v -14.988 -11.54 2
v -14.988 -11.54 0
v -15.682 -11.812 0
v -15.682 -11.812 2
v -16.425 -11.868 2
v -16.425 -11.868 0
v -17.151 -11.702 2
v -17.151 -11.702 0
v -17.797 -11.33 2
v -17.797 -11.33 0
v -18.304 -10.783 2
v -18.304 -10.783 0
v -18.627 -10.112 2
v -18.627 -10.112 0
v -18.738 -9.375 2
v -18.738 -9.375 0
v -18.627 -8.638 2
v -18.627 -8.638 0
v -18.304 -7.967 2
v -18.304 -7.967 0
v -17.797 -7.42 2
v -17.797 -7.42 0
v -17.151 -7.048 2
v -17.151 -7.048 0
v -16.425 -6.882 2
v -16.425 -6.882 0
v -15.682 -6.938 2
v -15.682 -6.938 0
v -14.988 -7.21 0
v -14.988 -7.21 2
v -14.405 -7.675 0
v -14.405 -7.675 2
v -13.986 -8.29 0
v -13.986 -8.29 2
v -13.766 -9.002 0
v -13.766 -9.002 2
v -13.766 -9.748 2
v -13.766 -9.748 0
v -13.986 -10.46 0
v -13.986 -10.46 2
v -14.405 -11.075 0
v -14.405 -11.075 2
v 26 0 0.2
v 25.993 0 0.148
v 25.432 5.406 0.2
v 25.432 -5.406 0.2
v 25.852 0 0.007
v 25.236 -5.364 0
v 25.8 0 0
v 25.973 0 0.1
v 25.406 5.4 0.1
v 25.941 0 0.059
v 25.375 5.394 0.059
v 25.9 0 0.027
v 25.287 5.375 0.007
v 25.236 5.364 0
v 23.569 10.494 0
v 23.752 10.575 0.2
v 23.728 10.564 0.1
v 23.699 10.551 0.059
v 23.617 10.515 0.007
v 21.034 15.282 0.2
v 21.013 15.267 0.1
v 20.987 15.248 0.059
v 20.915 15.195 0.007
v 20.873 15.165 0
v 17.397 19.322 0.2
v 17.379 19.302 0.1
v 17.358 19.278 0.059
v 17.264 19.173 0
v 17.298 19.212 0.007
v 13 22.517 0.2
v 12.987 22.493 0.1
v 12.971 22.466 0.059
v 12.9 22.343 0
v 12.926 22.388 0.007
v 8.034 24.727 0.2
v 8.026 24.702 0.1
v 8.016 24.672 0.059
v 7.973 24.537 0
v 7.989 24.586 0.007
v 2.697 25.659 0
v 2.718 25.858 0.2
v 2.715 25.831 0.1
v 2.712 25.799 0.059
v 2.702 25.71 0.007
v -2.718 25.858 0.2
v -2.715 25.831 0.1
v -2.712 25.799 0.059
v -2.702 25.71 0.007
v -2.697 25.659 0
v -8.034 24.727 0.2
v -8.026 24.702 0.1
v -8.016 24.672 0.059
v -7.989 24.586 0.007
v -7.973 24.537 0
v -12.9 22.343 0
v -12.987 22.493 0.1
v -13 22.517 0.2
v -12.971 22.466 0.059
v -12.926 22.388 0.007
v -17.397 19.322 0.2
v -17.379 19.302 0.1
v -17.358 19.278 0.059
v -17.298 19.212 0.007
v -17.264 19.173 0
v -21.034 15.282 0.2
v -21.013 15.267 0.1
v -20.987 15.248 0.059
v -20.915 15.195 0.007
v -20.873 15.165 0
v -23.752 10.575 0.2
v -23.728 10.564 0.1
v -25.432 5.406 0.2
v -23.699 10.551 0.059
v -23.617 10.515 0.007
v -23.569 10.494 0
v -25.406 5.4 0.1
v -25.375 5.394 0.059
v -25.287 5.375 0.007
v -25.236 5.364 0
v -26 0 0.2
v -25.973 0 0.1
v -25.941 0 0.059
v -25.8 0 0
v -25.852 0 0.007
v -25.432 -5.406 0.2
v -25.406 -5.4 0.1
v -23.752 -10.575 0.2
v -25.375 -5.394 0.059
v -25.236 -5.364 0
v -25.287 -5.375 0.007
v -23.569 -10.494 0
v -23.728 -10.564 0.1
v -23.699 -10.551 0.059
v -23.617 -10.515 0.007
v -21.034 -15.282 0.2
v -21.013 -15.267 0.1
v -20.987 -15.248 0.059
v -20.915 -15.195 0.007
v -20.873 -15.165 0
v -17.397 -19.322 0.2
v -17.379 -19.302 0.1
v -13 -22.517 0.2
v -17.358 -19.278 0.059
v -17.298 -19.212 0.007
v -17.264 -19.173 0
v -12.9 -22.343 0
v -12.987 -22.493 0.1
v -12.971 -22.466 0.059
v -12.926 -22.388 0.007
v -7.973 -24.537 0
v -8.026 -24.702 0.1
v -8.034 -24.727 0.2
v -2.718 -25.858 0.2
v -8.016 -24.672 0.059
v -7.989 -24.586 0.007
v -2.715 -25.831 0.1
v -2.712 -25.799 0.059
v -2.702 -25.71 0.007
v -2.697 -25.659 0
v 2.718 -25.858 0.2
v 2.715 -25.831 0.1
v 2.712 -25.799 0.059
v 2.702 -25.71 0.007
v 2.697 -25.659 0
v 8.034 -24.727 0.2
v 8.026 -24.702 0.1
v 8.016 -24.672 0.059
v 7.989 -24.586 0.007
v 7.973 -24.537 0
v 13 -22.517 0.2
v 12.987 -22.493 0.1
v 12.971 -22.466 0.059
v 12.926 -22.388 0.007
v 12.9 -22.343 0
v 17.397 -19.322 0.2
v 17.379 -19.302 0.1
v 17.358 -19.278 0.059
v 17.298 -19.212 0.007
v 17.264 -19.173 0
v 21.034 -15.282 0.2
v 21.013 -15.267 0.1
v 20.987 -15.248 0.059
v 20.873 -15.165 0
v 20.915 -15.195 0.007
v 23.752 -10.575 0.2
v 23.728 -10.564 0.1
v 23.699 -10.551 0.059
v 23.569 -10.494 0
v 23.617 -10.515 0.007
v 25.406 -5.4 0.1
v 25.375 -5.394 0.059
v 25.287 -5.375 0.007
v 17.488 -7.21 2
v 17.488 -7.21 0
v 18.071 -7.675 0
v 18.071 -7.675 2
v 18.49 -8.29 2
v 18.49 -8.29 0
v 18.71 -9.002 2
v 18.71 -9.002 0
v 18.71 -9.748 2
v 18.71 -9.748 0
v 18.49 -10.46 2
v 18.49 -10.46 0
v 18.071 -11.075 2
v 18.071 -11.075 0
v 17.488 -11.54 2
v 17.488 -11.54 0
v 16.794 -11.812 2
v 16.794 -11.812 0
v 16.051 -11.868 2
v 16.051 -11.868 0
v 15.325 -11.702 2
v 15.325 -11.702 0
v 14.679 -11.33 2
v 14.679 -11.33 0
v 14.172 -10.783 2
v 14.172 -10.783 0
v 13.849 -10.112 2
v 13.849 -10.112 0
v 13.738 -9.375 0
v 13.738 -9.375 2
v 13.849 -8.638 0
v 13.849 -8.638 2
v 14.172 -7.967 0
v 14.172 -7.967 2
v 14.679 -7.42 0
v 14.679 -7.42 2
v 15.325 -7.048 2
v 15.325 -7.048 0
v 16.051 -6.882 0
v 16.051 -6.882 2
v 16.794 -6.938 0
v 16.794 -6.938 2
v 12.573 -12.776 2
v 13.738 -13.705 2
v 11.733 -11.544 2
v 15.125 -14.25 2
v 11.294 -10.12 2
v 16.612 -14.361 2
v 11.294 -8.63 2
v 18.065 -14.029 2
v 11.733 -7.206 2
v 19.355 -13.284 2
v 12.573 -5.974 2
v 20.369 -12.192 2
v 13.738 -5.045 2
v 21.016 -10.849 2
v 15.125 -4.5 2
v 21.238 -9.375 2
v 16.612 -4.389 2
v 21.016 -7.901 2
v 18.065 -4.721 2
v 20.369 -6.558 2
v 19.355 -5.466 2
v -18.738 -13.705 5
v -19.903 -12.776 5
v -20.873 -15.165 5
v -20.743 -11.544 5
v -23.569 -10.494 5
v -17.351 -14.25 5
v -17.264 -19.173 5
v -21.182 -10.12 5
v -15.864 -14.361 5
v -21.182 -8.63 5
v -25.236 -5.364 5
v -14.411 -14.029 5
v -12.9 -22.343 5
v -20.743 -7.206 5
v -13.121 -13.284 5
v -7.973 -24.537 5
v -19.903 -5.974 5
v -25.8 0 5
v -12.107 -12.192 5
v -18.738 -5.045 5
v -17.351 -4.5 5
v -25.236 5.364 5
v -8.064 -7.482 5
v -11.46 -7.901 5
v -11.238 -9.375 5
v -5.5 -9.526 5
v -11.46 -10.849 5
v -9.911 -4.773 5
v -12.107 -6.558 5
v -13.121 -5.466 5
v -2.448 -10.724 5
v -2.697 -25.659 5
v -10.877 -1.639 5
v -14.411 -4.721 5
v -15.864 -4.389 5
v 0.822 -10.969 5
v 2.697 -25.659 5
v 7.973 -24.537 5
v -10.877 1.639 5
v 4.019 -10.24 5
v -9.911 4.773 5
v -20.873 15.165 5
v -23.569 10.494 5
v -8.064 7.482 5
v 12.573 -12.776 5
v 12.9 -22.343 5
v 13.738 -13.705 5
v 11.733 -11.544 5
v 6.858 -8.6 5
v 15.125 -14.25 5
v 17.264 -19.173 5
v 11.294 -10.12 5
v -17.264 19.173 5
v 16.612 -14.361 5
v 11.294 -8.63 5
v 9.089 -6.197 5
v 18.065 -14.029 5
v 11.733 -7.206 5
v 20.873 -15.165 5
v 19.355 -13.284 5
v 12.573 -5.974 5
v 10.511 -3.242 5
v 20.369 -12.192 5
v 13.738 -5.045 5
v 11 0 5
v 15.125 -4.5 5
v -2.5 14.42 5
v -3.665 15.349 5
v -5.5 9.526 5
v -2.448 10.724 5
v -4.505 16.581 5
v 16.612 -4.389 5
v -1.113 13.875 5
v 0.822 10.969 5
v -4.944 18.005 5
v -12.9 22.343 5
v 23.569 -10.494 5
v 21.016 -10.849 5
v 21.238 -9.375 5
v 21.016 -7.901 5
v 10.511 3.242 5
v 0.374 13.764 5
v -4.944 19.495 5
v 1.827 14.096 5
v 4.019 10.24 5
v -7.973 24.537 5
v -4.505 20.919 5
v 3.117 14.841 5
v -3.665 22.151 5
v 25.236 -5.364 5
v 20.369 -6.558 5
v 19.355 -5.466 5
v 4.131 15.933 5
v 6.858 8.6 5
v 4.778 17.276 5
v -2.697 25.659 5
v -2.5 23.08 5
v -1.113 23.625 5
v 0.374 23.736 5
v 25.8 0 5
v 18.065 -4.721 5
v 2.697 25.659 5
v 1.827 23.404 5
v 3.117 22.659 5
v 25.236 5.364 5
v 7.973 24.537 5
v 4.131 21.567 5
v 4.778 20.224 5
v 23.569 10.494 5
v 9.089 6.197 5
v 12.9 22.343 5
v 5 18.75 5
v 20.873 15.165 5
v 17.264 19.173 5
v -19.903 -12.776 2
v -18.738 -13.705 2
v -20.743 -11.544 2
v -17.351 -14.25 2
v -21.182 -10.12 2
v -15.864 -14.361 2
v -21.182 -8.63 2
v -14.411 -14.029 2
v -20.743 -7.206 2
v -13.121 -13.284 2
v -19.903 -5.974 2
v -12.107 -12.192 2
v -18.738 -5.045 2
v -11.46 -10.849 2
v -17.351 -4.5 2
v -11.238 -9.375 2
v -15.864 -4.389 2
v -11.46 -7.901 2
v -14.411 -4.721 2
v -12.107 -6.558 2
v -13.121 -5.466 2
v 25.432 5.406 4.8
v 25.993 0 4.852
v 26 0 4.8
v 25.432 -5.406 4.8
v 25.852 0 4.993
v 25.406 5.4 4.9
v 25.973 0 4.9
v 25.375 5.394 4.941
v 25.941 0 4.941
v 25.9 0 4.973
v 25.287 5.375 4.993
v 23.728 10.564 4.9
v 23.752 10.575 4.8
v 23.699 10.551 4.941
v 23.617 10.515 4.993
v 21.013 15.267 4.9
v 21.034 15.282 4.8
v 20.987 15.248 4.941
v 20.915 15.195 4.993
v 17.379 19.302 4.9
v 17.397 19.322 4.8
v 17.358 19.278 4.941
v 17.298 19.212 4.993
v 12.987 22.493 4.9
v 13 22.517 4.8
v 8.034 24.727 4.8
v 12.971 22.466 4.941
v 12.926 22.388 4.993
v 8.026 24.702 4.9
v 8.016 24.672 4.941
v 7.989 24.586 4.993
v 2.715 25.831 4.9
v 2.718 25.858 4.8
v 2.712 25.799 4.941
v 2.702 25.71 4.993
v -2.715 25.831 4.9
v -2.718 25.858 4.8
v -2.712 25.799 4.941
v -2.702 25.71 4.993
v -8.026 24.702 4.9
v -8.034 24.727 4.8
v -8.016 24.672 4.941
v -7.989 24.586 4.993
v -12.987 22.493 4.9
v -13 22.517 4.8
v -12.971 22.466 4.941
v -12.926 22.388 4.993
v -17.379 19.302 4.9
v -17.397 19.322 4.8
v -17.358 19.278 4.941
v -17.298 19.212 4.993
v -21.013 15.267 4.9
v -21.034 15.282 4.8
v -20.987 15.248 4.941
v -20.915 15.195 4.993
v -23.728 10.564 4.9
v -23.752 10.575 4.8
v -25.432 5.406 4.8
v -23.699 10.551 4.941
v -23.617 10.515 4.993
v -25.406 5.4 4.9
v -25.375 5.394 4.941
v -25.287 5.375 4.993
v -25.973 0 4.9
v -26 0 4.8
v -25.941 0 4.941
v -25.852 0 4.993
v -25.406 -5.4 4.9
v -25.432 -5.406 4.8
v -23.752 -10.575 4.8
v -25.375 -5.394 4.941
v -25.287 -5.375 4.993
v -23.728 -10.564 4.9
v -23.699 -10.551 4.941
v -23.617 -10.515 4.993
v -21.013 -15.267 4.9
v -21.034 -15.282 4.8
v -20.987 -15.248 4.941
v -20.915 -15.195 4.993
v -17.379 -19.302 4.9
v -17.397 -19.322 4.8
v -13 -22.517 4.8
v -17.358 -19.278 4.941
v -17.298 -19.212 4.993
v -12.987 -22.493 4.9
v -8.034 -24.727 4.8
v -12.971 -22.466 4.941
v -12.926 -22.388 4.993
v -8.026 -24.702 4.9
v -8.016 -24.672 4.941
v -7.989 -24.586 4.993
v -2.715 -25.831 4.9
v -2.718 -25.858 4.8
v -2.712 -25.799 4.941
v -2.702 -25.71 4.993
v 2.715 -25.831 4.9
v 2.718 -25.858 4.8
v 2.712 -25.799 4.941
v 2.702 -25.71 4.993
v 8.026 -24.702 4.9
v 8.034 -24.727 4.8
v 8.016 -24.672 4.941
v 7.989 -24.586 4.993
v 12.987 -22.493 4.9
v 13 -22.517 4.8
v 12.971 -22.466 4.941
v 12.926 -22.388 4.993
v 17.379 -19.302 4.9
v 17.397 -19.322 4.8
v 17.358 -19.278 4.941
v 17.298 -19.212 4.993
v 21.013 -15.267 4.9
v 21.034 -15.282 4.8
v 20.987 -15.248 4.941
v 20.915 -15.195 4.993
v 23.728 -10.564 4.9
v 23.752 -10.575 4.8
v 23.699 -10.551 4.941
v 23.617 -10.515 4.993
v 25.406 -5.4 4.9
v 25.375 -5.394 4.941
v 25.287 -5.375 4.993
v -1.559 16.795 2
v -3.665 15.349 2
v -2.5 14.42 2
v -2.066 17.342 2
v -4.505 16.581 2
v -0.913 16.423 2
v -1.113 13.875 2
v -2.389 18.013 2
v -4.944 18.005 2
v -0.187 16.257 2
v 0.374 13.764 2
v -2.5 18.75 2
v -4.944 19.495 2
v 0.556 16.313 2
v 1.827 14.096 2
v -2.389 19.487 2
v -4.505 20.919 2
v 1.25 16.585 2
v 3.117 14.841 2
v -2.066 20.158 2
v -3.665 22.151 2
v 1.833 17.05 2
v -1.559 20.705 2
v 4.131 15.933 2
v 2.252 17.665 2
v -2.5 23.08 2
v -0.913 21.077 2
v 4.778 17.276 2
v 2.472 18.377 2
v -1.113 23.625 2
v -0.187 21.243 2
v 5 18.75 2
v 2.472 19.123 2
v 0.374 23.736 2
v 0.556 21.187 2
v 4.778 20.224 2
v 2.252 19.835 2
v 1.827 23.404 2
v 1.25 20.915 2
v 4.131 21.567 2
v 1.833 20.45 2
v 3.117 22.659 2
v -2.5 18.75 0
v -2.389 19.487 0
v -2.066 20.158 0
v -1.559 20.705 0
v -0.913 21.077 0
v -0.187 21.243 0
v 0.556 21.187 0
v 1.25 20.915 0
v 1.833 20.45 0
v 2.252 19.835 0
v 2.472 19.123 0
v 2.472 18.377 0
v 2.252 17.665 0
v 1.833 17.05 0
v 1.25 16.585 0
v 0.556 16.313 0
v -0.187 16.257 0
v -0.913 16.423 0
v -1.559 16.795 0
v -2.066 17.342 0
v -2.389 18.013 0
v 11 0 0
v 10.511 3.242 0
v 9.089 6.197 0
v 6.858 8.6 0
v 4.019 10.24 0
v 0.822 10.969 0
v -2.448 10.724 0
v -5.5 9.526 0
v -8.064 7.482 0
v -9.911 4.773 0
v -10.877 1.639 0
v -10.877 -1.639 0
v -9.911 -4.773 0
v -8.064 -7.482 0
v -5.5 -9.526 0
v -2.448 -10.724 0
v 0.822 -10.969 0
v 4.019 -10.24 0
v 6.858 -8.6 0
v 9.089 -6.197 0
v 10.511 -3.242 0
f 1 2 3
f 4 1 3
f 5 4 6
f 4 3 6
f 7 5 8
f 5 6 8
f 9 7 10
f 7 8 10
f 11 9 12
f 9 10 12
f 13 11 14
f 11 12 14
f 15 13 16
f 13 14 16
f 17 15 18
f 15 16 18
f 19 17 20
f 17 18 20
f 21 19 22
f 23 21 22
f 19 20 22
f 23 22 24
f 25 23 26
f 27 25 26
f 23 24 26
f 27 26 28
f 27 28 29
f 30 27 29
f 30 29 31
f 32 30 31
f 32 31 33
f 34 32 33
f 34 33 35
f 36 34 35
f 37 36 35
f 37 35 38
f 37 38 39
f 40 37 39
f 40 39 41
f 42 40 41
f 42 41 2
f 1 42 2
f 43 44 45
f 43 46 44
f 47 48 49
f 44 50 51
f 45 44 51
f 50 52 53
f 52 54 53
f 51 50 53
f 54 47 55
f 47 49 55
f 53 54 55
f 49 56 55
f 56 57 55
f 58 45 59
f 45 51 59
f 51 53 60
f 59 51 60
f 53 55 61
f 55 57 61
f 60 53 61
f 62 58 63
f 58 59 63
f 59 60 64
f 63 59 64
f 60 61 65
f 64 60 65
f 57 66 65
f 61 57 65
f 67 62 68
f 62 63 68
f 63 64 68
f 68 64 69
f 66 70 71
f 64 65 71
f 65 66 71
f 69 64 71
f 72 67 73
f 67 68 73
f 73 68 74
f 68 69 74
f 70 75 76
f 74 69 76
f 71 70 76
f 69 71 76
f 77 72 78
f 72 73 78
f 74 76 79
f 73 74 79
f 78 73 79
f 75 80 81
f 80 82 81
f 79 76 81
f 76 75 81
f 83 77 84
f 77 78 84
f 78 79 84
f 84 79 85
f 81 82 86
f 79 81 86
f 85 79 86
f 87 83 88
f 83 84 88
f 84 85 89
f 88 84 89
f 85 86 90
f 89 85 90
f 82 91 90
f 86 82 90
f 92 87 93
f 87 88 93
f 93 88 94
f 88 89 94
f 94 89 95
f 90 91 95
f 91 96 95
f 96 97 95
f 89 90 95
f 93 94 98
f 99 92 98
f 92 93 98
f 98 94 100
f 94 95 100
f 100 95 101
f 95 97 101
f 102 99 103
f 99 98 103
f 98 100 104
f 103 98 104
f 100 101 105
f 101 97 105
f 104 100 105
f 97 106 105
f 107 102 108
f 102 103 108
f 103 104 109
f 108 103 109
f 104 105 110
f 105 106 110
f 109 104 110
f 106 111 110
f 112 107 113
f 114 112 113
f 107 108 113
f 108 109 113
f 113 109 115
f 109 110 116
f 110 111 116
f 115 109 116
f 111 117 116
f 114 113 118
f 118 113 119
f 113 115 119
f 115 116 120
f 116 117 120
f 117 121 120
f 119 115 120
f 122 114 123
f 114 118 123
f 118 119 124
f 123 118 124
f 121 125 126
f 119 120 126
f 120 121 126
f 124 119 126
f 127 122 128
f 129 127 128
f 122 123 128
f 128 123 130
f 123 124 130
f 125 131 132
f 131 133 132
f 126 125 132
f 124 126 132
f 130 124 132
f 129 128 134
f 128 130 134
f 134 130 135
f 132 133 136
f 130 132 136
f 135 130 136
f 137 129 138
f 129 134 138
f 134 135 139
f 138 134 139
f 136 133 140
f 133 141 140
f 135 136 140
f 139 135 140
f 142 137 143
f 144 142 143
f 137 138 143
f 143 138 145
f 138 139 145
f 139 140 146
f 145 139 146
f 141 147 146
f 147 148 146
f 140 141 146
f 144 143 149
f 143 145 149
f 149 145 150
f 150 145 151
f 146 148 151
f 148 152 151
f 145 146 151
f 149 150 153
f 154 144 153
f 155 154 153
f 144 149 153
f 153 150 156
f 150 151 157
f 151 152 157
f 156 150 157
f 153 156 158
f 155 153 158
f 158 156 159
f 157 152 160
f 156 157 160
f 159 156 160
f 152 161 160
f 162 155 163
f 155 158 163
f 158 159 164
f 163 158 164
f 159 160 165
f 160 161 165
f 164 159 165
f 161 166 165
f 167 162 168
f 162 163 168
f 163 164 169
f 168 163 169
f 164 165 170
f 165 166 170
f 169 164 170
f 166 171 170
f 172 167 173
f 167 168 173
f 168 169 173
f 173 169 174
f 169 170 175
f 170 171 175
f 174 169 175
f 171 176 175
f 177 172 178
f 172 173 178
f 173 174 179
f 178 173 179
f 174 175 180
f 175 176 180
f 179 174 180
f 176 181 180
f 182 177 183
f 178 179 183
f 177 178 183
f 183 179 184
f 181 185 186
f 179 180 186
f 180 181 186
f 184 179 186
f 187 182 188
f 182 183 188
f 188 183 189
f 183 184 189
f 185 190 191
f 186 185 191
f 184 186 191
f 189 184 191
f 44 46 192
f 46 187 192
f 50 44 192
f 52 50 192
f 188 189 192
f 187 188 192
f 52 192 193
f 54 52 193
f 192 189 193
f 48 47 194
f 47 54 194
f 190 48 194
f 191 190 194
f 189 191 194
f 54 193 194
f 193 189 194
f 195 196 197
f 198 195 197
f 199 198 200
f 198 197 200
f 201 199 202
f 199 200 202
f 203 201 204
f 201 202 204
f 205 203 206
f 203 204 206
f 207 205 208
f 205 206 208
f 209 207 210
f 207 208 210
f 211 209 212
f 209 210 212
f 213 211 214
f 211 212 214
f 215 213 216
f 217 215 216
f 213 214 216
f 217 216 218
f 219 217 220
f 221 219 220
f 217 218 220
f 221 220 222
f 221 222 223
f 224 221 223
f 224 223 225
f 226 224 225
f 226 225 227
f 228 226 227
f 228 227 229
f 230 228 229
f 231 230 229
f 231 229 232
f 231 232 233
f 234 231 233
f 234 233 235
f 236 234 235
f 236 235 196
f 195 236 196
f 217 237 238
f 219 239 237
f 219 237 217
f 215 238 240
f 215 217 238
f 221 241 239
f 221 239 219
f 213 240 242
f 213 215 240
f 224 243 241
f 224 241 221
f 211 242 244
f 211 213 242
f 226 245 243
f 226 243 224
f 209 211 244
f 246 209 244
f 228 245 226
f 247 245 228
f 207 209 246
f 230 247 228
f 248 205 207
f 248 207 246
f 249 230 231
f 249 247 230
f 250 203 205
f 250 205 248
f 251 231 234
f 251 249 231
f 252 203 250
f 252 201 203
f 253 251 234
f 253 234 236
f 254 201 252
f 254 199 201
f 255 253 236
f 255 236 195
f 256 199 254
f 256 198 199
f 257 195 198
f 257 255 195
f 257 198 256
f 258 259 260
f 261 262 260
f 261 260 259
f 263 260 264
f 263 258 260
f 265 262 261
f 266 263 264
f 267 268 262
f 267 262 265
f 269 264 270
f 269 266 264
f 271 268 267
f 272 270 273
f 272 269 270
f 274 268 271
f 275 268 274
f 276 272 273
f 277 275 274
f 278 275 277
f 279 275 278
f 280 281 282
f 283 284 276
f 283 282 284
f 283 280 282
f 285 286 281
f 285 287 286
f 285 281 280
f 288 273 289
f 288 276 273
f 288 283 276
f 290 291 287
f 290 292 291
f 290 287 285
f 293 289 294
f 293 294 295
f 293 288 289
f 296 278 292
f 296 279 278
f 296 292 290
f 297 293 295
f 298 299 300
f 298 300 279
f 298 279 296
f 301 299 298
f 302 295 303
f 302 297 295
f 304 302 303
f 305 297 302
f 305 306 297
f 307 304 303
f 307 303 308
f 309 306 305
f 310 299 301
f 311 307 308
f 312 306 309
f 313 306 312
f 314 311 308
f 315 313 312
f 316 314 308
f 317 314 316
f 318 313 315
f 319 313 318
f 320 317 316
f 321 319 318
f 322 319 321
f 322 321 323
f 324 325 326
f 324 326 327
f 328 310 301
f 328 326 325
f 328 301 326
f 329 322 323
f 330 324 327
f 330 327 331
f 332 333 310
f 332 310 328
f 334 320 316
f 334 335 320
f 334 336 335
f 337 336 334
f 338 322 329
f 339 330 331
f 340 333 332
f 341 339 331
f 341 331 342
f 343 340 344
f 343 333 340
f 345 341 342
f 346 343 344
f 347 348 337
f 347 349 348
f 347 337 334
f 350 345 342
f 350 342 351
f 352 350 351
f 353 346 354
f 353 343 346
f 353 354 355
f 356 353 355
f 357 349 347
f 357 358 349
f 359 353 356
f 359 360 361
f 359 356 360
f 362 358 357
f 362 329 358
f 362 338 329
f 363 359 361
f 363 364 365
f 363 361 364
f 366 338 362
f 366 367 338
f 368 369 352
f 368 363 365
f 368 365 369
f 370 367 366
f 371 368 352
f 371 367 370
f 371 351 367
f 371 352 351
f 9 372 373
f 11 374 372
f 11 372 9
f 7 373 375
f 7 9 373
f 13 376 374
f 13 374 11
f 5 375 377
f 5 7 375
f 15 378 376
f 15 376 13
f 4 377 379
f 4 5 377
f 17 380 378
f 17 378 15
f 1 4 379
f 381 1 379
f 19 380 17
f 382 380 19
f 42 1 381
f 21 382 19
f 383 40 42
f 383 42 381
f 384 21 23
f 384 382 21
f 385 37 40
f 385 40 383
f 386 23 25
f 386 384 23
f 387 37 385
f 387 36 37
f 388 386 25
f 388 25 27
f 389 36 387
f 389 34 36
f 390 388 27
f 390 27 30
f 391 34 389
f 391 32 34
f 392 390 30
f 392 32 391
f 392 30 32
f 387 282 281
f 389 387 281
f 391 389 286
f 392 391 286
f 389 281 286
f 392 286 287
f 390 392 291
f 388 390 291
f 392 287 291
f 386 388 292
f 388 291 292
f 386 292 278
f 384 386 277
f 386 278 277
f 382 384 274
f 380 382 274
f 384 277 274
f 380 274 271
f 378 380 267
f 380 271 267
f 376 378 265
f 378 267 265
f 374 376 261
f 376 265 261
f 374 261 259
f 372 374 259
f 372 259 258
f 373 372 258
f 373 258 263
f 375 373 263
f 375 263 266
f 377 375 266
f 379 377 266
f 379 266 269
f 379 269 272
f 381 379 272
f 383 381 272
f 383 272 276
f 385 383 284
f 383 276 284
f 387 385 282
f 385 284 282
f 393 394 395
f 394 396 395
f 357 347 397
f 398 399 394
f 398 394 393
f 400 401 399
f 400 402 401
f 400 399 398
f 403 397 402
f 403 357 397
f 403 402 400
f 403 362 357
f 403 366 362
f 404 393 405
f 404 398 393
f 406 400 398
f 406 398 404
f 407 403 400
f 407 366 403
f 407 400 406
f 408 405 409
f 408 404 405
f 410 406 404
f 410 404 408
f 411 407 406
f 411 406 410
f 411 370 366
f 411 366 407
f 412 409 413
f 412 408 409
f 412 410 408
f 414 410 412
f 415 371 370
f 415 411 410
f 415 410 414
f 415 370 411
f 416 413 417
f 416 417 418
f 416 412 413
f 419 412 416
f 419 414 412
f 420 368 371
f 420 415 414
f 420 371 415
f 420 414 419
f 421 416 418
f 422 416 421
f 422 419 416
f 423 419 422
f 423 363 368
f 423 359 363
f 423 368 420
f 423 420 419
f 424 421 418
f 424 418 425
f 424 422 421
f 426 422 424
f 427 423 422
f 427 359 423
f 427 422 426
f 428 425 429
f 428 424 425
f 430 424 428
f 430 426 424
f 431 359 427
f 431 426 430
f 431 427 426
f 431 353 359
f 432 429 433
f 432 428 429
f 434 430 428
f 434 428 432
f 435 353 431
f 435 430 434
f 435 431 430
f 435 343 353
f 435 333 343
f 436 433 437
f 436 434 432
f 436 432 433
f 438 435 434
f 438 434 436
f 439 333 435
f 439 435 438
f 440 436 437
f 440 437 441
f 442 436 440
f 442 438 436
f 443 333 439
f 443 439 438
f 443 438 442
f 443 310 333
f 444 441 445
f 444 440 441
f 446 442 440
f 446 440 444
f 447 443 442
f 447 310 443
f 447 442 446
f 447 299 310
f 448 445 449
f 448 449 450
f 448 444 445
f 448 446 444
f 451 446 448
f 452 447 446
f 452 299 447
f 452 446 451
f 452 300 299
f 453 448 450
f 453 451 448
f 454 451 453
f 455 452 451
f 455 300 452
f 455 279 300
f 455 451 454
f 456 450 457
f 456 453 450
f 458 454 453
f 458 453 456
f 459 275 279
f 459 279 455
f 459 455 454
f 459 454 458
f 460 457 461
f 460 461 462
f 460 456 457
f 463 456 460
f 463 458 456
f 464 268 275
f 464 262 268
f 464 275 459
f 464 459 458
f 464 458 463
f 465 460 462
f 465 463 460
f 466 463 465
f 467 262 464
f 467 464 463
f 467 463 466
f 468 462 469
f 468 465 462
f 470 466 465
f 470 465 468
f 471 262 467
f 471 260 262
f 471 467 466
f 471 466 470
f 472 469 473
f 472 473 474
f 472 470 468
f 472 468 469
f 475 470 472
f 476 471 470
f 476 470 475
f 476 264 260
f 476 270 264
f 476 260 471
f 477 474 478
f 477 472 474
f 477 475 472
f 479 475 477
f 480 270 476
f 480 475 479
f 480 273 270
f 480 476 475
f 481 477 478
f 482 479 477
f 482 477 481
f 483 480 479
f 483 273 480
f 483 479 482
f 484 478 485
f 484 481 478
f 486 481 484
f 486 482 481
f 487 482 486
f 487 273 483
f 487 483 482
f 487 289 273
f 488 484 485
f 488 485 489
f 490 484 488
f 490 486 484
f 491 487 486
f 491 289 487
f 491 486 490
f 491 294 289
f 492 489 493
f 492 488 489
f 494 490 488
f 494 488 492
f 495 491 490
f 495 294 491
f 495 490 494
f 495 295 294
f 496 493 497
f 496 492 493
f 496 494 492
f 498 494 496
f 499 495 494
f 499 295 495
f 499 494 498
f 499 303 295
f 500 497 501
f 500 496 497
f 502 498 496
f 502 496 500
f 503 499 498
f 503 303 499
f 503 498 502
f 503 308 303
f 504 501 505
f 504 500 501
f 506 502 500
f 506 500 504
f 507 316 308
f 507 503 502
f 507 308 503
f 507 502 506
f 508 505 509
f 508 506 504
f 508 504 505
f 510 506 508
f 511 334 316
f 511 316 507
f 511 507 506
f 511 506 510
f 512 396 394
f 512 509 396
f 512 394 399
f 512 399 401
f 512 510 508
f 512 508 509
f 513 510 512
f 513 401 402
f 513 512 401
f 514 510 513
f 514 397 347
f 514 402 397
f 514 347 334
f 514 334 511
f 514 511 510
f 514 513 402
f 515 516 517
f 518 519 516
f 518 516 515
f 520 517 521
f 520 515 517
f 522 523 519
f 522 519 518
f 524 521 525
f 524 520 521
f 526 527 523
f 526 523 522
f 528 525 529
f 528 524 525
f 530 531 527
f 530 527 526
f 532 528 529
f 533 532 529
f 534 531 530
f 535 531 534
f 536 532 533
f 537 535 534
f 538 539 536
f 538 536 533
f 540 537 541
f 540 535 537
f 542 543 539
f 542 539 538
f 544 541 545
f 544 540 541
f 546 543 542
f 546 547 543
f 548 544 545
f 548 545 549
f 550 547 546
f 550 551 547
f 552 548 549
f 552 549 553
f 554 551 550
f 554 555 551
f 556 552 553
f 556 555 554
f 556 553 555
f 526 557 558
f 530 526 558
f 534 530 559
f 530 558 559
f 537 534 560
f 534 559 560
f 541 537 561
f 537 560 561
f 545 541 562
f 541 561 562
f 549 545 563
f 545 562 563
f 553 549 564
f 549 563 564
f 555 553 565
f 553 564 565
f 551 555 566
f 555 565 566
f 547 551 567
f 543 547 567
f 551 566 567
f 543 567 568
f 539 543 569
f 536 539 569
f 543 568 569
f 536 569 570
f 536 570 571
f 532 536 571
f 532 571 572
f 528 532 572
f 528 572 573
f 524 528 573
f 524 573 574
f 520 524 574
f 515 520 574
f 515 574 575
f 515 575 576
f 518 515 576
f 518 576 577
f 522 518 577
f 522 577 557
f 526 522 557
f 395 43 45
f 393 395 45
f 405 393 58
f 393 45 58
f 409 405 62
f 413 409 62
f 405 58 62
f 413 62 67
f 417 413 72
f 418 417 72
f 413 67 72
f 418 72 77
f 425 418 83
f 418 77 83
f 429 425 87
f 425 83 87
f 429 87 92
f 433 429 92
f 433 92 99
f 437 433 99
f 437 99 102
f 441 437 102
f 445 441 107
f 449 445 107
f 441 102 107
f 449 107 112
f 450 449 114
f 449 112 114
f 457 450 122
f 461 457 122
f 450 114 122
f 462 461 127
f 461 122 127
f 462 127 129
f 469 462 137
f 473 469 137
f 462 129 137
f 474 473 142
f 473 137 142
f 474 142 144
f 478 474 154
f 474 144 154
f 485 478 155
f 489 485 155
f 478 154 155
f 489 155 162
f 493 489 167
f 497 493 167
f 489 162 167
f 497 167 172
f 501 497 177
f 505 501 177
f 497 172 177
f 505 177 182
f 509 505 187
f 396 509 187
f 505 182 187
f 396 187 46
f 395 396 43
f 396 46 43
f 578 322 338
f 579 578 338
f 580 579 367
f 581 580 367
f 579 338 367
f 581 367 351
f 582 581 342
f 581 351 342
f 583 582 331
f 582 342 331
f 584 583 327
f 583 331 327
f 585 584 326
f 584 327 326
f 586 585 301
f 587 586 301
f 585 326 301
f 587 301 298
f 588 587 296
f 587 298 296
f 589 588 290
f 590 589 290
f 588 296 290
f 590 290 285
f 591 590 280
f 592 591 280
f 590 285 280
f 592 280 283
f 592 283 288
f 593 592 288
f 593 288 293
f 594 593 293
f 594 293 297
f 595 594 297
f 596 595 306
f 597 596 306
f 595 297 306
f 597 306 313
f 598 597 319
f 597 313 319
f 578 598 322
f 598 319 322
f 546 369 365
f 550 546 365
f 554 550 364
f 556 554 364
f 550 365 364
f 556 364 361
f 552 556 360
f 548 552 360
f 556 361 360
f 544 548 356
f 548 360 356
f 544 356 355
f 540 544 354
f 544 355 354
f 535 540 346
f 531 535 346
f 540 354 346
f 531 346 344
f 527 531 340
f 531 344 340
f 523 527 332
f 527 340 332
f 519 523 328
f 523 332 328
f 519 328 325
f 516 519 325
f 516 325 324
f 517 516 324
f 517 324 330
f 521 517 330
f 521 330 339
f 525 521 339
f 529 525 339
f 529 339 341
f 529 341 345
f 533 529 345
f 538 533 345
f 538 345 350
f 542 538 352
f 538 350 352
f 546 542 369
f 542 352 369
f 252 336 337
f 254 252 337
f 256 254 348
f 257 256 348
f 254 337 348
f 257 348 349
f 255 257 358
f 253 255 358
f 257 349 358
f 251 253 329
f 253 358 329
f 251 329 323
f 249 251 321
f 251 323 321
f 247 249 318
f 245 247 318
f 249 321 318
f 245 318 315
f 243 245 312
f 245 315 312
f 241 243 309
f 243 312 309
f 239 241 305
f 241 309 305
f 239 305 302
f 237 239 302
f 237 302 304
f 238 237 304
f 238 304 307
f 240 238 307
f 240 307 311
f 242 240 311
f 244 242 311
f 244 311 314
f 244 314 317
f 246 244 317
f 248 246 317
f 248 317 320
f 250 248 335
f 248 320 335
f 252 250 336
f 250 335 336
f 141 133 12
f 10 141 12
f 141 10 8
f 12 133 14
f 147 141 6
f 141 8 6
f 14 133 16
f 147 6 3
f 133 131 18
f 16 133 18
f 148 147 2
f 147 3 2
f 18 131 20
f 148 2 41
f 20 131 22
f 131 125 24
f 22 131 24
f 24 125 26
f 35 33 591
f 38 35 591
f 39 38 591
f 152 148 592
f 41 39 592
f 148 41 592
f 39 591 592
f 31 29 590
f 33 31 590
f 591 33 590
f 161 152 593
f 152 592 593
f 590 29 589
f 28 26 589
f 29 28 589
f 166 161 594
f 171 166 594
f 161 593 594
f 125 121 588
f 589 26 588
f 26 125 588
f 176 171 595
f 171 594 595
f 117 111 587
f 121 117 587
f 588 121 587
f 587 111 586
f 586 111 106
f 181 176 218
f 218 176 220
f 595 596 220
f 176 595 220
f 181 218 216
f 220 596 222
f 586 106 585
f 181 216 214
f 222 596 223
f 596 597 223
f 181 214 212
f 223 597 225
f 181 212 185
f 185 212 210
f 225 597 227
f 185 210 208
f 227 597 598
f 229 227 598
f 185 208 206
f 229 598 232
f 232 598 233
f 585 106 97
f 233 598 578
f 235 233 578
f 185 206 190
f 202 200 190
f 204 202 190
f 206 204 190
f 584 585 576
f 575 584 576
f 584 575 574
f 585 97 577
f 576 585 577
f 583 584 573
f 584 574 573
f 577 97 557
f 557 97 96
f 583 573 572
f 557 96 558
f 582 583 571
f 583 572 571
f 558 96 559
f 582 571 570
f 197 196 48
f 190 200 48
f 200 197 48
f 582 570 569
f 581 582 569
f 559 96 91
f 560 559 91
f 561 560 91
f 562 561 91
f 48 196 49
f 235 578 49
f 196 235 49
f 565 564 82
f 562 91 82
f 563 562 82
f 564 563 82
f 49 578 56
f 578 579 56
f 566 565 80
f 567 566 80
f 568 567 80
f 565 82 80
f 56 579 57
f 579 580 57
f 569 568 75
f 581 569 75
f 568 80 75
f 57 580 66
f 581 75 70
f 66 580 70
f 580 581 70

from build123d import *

# Parameters (mm, degrees)
SKETCH1_R            = 26
BOSS_EXTRUDE1_DEPTH  = 5
M5_CLEARANCE_HOLE1_D = 5
CIRPATTERN1_COUNT    = 3
SKETCH4_R            = 11
CUT_EXTRUDE1_DEPTH   = 5
FILLET1_R            = 0.2
SKETCH5_R            = 5
CUT_EXTRUDE2_DEPTH   = 3


with BuildPart() as part:
    # Sketch1 → Boss-Extrude1 (new body)
    with BuildSketch(Plane.XY):
        Circle(SKETCH1_R)
    extrude(amount=BOSS_EXTRUDE1_DEPTH)

    # M5 Clearance Hole1 (through all)
    with Locations(Plane.XY.offset(5)):
        with Locations((0, 18.75)):
            m5_clearance_hole1 = Hole(M5_CLEARANCE_HOLE1_D / 2)

    # CirPattern1: M5 Clearance Hole1 ×3 about axis
    cirpattern1_axis = Axis((0, 0, 0), (0, 0, 1))
    for i in range(1, CIRPATTERN1_COUNT):
        add(m5_clearance_hole1.rotate(cirpattern1_axis, i * 360 / CIRPATTERN1_COUNT), mode=Mode.SUBTRACT)

    # Sketch4 → Cut-Extrude1 (cut)
    with BuildSketch(Plane.XY.offset(5)):
        Circle(SKETCH4_R)
    extrude(amount=-CUT_EXTRUDE1_DEPTH, mode=Mode.SUBTRACT)

    # Fillet1
    fillet1_edges = [part.edges().sort_by_distance(p)[0] for p in [
        (-26, 0, 0),
        (-26, 0, 5),
    ]]
    fillet(fillet1_edges, radius=FILLET1_R)

    # Sketch5 → Cut-Extrude2 (cut)
    with BuildSketch(Plane.XY.offset(5)):
        with Locations((0, 18.75)):
            Circle(SKETCH5_R)
        with Locations((-16.237976321, -9.375)):
            Circle(SKETCH5_R)
        with Locations((16.237976321, -9.375)):
            Circle(SKETCH5_R)
    extrude(amount=-CUT_EXTRUDE2_DEPTH, mode=Mode.SUBTRACT)


solid = part.part
